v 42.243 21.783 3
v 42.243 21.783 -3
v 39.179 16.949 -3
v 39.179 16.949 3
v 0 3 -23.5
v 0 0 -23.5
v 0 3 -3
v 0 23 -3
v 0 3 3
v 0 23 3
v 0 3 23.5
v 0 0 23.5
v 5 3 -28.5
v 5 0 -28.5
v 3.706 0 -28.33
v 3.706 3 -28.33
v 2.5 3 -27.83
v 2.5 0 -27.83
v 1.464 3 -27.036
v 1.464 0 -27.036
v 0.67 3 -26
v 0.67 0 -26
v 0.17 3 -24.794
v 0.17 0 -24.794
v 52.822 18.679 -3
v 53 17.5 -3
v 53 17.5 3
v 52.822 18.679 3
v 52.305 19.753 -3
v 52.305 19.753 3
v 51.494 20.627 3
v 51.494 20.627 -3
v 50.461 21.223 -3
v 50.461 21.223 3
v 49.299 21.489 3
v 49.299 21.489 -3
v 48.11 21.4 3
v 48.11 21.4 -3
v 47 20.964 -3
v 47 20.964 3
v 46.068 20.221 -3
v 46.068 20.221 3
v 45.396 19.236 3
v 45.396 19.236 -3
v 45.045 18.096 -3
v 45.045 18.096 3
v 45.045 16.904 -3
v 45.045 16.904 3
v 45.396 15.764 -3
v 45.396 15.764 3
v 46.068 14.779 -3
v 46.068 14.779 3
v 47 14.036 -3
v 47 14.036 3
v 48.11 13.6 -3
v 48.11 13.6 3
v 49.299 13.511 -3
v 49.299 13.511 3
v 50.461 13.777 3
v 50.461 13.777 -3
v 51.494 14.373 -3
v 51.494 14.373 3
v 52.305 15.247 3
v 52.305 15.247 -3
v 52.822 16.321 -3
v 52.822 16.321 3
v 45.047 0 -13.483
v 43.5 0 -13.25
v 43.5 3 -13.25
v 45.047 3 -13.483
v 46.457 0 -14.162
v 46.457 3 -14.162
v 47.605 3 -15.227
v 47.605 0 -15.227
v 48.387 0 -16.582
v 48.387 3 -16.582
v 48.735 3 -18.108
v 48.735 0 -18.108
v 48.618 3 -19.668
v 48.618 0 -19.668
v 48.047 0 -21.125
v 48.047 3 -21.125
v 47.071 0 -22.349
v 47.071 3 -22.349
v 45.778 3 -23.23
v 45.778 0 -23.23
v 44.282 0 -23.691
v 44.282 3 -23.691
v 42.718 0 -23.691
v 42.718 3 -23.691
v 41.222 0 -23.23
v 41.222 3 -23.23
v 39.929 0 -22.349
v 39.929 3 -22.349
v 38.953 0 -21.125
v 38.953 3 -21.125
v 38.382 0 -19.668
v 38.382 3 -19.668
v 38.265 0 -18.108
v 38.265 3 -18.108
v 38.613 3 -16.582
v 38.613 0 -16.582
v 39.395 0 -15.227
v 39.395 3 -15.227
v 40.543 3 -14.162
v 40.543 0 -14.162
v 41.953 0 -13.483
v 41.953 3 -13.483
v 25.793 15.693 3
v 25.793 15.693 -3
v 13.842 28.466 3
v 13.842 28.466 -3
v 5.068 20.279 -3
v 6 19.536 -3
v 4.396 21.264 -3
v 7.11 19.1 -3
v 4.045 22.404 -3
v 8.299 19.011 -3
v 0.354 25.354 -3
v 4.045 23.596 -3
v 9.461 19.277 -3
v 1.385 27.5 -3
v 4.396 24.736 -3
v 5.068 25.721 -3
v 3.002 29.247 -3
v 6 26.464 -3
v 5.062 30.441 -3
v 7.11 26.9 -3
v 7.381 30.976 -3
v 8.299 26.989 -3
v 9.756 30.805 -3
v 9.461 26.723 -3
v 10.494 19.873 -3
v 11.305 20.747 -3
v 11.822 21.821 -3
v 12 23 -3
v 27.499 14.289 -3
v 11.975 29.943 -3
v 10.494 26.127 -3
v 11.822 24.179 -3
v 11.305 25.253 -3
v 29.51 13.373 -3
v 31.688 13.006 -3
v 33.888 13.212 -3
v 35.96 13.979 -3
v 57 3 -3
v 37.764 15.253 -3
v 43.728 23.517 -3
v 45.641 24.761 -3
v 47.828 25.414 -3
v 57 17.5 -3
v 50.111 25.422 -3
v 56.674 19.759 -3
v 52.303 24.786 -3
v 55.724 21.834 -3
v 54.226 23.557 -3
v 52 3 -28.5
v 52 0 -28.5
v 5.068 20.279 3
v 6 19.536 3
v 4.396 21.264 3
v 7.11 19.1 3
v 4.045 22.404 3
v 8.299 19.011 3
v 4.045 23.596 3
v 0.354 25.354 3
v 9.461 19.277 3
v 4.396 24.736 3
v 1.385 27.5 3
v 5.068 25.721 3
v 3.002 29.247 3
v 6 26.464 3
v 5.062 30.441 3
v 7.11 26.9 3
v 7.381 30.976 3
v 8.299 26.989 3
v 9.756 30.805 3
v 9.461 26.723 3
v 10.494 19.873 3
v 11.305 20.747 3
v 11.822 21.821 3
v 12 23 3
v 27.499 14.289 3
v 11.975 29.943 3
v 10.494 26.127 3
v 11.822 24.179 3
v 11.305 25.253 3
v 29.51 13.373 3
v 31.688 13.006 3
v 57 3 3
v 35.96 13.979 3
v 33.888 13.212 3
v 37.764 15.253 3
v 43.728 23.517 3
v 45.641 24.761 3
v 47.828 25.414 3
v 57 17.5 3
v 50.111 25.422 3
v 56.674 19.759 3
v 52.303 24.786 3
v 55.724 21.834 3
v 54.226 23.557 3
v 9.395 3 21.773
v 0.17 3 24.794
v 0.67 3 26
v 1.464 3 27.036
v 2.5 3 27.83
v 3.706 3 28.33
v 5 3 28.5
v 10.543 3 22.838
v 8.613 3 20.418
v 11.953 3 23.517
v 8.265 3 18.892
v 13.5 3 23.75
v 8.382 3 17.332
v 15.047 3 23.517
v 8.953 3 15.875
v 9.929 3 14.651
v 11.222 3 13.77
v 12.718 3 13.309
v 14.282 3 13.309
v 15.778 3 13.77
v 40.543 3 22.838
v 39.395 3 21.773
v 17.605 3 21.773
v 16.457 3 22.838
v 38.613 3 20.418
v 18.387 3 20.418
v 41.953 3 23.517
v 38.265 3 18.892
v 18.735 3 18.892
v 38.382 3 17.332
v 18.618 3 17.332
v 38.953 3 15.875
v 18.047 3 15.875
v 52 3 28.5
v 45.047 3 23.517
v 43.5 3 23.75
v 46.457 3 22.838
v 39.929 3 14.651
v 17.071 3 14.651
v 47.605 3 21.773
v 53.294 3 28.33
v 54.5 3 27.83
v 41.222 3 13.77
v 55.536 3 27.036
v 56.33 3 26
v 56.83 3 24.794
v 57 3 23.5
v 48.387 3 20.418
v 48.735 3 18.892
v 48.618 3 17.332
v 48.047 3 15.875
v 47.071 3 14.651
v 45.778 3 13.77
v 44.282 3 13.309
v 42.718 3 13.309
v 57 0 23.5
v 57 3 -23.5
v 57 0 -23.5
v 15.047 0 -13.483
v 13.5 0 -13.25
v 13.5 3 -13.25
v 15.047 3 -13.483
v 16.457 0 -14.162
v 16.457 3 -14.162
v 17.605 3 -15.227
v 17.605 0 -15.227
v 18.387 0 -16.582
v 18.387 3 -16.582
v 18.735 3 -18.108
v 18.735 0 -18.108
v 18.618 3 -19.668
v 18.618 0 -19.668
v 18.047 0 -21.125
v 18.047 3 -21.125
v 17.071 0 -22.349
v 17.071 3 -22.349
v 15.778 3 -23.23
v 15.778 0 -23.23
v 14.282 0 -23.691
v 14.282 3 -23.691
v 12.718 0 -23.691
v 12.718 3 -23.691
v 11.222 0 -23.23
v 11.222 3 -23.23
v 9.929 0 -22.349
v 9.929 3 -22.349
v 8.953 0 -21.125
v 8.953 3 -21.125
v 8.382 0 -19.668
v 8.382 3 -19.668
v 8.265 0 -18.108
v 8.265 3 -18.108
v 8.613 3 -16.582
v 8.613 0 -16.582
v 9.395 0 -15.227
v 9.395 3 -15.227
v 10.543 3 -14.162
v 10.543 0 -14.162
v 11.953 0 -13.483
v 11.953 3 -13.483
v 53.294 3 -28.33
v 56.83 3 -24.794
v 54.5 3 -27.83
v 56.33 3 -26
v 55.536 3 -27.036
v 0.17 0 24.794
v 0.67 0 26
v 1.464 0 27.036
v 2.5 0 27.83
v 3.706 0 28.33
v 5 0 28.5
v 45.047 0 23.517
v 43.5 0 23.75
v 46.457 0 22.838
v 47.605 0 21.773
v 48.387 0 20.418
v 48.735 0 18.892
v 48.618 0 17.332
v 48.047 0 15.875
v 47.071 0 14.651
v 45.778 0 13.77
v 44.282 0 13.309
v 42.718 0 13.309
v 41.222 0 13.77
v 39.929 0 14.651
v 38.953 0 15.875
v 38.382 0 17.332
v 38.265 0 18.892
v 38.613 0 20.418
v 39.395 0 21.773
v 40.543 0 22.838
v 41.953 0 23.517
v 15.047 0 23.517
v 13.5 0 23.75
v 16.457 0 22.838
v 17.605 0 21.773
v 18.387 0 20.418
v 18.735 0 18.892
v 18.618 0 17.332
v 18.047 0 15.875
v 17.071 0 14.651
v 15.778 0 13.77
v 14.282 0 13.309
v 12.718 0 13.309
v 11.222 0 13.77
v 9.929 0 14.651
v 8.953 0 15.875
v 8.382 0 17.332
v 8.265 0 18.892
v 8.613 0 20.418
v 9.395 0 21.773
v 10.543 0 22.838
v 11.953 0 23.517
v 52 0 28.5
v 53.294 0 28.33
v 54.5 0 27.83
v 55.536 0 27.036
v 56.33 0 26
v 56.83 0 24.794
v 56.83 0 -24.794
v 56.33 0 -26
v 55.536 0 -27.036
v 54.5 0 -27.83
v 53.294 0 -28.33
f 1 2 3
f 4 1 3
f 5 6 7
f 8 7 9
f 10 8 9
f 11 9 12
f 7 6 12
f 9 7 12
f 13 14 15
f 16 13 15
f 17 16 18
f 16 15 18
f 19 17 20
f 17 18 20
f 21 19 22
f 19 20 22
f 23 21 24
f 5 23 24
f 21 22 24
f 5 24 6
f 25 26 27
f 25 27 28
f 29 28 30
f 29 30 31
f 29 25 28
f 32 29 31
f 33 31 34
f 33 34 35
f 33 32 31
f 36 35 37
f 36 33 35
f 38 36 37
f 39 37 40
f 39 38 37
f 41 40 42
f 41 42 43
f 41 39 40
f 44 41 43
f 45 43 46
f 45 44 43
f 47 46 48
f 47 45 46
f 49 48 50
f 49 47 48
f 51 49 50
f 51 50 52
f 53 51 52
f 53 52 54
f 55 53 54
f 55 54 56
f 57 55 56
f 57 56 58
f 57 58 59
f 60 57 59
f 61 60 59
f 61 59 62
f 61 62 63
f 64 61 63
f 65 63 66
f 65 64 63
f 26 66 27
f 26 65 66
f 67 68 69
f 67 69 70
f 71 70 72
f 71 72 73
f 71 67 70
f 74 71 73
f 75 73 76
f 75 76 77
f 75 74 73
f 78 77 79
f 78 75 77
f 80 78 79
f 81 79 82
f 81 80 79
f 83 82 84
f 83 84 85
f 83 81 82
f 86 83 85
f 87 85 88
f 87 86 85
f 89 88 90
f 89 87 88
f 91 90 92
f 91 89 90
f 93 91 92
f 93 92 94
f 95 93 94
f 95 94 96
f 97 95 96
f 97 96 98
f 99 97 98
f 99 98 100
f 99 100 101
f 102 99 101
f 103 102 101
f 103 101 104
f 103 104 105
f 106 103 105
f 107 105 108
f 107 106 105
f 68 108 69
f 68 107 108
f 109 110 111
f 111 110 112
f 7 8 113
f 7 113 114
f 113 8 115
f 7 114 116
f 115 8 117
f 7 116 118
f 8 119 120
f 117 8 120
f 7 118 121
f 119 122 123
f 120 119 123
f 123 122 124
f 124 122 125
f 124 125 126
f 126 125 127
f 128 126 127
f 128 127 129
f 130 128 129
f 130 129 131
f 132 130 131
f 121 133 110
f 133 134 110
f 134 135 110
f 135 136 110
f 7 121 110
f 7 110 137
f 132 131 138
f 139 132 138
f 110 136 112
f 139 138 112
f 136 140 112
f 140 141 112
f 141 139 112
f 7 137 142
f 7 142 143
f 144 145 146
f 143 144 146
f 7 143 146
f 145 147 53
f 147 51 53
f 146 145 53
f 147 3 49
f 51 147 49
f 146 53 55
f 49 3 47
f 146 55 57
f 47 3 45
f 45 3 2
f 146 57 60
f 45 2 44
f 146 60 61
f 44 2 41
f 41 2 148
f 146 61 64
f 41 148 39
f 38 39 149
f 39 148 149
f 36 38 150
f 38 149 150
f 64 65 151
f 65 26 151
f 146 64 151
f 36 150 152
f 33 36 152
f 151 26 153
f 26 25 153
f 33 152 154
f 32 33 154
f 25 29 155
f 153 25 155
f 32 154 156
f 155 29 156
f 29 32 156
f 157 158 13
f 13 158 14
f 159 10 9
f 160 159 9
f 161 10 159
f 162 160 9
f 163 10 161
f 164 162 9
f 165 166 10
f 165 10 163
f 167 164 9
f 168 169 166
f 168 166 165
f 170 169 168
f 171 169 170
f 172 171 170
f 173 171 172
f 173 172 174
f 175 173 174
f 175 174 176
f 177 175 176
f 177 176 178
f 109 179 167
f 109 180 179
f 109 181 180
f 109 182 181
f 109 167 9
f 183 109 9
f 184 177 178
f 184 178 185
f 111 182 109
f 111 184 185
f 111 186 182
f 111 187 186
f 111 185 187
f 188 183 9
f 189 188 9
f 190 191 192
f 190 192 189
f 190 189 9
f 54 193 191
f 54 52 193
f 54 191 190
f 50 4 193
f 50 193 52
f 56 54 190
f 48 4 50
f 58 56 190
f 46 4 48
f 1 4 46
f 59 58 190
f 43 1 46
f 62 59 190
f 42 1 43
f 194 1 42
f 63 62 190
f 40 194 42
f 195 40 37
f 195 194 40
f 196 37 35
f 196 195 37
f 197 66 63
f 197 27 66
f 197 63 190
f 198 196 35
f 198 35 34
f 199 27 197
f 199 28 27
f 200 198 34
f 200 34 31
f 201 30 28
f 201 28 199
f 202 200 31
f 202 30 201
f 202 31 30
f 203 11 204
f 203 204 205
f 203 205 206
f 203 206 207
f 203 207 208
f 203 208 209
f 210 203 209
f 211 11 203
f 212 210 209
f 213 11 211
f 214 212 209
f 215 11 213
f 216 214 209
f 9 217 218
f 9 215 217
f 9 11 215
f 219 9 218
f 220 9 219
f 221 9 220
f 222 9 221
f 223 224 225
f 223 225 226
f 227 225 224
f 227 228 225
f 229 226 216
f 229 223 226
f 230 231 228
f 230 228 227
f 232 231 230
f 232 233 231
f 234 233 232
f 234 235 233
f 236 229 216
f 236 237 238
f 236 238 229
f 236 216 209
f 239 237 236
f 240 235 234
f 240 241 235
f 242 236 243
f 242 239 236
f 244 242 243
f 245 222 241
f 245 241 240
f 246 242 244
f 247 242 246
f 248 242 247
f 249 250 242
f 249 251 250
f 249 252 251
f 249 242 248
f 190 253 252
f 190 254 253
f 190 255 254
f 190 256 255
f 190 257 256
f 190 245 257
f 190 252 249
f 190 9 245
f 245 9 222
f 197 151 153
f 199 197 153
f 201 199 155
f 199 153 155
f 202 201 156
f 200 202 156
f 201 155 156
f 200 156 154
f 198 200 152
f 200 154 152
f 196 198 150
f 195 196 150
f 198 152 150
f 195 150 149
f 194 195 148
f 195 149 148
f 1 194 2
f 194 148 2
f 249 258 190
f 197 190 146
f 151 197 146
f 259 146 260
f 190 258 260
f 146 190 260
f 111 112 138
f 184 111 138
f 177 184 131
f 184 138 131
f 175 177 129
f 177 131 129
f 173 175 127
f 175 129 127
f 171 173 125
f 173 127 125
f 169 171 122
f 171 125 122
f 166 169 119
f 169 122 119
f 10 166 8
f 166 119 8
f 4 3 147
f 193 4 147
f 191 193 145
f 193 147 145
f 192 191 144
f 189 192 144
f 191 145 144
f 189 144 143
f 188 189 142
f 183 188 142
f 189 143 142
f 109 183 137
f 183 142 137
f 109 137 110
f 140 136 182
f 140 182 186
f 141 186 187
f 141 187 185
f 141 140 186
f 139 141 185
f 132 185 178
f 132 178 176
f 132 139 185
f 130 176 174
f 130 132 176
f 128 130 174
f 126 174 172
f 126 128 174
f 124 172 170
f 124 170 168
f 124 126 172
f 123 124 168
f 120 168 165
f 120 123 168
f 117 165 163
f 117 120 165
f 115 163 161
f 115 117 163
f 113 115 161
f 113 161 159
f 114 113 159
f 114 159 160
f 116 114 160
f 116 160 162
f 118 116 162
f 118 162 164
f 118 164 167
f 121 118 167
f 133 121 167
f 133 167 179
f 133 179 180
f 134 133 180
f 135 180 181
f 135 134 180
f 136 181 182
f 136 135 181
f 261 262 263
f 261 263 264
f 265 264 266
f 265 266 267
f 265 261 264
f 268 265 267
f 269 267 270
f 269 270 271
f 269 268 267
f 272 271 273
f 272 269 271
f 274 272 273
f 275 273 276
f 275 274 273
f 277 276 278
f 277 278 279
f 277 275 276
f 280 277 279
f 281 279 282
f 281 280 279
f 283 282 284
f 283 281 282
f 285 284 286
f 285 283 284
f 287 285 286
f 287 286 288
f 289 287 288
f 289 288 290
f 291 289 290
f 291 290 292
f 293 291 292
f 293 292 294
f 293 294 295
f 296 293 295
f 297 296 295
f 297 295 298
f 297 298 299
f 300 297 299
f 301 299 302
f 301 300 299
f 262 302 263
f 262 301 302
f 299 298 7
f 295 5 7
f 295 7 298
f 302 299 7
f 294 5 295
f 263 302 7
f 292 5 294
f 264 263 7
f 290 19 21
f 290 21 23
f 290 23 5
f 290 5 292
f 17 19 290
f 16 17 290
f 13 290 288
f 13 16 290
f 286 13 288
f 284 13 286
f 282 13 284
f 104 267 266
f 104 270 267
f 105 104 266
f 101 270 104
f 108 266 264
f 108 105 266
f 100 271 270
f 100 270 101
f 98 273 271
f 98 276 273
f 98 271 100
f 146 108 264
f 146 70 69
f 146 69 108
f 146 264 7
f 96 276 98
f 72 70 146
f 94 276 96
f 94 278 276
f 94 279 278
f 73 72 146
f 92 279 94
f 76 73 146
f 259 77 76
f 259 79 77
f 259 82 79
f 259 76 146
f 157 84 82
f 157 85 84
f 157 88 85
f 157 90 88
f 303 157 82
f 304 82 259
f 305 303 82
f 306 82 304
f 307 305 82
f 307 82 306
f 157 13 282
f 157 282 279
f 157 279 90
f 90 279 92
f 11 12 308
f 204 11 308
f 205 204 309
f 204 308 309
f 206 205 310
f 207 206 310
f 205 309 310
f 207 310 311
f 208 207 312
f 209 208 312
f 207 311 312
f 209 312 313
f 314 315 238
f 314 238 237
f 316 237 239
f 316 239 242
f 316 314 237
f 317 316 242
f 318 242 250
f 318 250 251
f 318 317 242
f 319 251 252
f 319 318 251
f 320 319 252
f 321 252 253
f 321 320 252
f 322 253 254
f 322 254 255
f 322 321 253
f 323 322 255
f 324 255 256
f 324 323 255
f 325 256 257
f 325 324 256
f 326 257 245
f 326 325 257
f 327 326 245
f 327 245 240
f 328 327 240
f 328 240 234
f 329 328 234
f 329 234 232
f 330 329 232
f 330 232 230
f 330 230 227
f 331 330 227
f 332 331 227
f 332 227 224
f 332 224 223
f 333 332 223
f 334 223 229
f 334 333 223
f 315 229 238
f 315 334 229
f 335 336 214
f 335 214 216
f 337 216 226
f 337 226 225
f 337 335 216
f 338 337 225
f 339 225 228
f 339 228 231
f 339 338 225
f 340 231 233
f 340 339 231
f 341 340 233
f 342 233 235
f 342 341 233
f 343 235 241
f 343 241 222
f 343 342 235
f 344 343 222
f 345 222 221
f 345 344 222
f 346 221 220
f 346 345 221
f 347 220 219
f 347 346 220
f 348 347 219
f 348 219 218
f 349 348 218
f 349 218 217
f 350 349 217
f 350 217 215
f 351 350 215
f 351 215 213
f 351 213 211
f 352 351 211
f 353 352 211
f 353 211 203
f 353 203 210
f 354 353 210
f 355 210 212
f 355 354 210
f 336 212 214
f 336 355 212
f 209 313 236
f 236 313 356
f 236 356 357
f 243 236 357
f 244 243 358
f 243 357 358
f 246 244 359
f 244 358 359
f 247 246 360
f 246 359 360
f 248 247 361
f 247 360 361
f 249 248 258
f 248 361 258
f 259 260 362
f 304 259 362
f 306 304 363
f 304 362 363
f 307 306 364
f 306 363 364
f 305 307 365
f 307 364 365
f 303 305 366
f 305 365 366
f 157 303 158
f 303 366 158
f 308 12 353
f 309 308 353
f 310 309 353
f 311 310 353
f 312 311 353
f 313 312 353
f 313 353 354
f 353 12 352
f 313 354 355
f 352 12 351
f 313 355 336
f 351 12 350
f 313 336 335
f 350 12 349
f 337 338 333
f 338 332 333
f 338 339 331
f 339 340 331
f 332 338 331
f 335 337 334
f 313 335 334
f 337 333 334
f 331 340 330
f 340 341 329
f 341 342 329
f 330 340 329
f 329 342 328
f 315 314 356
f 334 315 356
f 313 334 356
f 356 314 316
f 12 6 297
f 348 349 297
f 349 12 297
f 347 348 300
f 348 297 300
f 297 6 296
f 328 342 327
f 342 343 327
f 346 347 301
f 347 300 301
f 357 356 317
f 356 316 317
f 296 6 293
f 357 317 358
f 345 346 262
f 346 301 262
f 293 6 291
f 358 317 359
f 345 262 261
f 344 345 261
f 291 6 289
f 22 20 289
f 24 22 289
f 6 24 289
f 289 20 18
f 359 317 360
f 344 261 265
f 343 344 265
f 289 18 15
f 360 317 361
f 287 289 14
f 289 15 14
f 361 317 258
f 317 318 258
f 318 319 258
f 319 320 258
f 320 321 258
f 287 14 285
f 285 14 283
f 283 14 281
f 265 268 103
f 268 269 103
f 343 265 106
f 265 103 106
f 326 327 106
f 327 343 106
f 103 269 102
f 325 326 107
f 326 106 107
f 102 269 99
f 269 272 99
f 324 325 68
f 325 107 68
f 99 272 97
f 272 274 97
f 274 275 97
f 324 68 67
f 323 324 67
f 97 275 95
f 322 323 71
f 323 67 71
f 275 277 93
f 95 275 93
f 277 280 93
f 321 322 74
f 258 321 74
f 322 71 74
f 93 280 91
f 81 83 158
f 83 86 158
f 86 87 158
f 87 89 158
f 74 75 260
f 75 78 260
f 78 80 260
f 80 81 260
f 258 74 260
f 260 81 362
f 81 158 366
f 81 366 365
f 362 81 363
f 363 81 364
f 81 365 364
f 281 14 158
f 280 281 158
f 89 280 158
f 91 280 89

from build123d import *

# Parameters (mm, degrees)
EXTRUDE_1_DEPTH      = 3
EXTRUDE_1_DEPTH_BACK = 3
SKETCH_1_R           = 4
SKETCH_2_R           = 5.25
EXTRUDE_2_DEPTH      = 3


with BuildPart() as part:
    # 草图1 → 凸台-拉伸1 (new, two sides: drawn at the far end of the back side and taken through both)
    with BuildSketch(Plane.XY.offset(-EXTRUDE_1_DEPTH_BACK)):
        with BuildLine():
            Line((0, 0), (57, 0))
            Line((57, 0), (57, 17.5))
            ThreePointArc((57, 17.5), (51.229837516, 25.182956765), (42.243043837, 21.782936307))
            Line((42.243043837, 21.782936307), (39.179265923, 16.949380174))
            ThreePointArc((39.179265923, 16.949380174), (32.794593586, 13.037221435), (25.793283338, 15.692533403))
            Line((25.793283338, 15.692533403), (13.841615682, 28.465850915))
            ThreePointArc((13.841615682, 28.465850915), (5.061711847, 30.44086438), (0, 23))
            Line((0, 23), (0, 0))
        make_face()
        with Locations((49, 17.5)):
            Circle(SKETCH_1_R, mode=Mode.SUBTRACT)
        with Locations((8, 23)):
            Circle(SKETCH_1_R, mode=Mode.SUBTRACT)
    extrude(amount=EXTRUDE_1_DEPTH + EXTRUDE_1_DEPTH_BACK)

    # 草图2 → 凸台-拉伸2 (add)
    with BuildSketch(Plane(origin=(0, 0, 0), x_dir=(1, 0, 0), z_dir=(0, 1, 0))):
        with BuildLine():
            Line((5, -28.5), (52, -28.5))
            ThreePointArc((52, -28.5), (55.535533906, -27.035533906), (57, -23.5))
            Line((57, -23.5), (57, 23.5))
            ThreePointArc((57, 23.5), (55.535533906, 27.035533906), (52, 28.5))
            Line((52, 28.5), (5, 28.5))
            ThreePointArc((5, 28.5), (1.464466094, 27.035533906), (0, 23.5))
            Line((0, 23.5), (0, -23.5))
            ThreePointArc((0, -23.5), (1.464466094, -27.035533906), (5, -28.5))
        make_face()
        with Locations((43.5, -18.5)):
            Circle(SKETCH_2_R, mode=Mode.SUBTRACT)
        with Locations((43.5, 18.5)):
            Circle(SKETCH_2_R, mode=Mode.SUBTRACT)
        with Locations((13.5, -18.5)):
            Circle(SKETCH_2_R, mode=Mode.SUBTRACT)
        with Locations((13.5, 18.5)):
            Circle(SKETCH_2_R, mode=Mode.SUBTRACT)
    extrude(amount=EXTRUDE_2_DEPTH)


solid = part.part
